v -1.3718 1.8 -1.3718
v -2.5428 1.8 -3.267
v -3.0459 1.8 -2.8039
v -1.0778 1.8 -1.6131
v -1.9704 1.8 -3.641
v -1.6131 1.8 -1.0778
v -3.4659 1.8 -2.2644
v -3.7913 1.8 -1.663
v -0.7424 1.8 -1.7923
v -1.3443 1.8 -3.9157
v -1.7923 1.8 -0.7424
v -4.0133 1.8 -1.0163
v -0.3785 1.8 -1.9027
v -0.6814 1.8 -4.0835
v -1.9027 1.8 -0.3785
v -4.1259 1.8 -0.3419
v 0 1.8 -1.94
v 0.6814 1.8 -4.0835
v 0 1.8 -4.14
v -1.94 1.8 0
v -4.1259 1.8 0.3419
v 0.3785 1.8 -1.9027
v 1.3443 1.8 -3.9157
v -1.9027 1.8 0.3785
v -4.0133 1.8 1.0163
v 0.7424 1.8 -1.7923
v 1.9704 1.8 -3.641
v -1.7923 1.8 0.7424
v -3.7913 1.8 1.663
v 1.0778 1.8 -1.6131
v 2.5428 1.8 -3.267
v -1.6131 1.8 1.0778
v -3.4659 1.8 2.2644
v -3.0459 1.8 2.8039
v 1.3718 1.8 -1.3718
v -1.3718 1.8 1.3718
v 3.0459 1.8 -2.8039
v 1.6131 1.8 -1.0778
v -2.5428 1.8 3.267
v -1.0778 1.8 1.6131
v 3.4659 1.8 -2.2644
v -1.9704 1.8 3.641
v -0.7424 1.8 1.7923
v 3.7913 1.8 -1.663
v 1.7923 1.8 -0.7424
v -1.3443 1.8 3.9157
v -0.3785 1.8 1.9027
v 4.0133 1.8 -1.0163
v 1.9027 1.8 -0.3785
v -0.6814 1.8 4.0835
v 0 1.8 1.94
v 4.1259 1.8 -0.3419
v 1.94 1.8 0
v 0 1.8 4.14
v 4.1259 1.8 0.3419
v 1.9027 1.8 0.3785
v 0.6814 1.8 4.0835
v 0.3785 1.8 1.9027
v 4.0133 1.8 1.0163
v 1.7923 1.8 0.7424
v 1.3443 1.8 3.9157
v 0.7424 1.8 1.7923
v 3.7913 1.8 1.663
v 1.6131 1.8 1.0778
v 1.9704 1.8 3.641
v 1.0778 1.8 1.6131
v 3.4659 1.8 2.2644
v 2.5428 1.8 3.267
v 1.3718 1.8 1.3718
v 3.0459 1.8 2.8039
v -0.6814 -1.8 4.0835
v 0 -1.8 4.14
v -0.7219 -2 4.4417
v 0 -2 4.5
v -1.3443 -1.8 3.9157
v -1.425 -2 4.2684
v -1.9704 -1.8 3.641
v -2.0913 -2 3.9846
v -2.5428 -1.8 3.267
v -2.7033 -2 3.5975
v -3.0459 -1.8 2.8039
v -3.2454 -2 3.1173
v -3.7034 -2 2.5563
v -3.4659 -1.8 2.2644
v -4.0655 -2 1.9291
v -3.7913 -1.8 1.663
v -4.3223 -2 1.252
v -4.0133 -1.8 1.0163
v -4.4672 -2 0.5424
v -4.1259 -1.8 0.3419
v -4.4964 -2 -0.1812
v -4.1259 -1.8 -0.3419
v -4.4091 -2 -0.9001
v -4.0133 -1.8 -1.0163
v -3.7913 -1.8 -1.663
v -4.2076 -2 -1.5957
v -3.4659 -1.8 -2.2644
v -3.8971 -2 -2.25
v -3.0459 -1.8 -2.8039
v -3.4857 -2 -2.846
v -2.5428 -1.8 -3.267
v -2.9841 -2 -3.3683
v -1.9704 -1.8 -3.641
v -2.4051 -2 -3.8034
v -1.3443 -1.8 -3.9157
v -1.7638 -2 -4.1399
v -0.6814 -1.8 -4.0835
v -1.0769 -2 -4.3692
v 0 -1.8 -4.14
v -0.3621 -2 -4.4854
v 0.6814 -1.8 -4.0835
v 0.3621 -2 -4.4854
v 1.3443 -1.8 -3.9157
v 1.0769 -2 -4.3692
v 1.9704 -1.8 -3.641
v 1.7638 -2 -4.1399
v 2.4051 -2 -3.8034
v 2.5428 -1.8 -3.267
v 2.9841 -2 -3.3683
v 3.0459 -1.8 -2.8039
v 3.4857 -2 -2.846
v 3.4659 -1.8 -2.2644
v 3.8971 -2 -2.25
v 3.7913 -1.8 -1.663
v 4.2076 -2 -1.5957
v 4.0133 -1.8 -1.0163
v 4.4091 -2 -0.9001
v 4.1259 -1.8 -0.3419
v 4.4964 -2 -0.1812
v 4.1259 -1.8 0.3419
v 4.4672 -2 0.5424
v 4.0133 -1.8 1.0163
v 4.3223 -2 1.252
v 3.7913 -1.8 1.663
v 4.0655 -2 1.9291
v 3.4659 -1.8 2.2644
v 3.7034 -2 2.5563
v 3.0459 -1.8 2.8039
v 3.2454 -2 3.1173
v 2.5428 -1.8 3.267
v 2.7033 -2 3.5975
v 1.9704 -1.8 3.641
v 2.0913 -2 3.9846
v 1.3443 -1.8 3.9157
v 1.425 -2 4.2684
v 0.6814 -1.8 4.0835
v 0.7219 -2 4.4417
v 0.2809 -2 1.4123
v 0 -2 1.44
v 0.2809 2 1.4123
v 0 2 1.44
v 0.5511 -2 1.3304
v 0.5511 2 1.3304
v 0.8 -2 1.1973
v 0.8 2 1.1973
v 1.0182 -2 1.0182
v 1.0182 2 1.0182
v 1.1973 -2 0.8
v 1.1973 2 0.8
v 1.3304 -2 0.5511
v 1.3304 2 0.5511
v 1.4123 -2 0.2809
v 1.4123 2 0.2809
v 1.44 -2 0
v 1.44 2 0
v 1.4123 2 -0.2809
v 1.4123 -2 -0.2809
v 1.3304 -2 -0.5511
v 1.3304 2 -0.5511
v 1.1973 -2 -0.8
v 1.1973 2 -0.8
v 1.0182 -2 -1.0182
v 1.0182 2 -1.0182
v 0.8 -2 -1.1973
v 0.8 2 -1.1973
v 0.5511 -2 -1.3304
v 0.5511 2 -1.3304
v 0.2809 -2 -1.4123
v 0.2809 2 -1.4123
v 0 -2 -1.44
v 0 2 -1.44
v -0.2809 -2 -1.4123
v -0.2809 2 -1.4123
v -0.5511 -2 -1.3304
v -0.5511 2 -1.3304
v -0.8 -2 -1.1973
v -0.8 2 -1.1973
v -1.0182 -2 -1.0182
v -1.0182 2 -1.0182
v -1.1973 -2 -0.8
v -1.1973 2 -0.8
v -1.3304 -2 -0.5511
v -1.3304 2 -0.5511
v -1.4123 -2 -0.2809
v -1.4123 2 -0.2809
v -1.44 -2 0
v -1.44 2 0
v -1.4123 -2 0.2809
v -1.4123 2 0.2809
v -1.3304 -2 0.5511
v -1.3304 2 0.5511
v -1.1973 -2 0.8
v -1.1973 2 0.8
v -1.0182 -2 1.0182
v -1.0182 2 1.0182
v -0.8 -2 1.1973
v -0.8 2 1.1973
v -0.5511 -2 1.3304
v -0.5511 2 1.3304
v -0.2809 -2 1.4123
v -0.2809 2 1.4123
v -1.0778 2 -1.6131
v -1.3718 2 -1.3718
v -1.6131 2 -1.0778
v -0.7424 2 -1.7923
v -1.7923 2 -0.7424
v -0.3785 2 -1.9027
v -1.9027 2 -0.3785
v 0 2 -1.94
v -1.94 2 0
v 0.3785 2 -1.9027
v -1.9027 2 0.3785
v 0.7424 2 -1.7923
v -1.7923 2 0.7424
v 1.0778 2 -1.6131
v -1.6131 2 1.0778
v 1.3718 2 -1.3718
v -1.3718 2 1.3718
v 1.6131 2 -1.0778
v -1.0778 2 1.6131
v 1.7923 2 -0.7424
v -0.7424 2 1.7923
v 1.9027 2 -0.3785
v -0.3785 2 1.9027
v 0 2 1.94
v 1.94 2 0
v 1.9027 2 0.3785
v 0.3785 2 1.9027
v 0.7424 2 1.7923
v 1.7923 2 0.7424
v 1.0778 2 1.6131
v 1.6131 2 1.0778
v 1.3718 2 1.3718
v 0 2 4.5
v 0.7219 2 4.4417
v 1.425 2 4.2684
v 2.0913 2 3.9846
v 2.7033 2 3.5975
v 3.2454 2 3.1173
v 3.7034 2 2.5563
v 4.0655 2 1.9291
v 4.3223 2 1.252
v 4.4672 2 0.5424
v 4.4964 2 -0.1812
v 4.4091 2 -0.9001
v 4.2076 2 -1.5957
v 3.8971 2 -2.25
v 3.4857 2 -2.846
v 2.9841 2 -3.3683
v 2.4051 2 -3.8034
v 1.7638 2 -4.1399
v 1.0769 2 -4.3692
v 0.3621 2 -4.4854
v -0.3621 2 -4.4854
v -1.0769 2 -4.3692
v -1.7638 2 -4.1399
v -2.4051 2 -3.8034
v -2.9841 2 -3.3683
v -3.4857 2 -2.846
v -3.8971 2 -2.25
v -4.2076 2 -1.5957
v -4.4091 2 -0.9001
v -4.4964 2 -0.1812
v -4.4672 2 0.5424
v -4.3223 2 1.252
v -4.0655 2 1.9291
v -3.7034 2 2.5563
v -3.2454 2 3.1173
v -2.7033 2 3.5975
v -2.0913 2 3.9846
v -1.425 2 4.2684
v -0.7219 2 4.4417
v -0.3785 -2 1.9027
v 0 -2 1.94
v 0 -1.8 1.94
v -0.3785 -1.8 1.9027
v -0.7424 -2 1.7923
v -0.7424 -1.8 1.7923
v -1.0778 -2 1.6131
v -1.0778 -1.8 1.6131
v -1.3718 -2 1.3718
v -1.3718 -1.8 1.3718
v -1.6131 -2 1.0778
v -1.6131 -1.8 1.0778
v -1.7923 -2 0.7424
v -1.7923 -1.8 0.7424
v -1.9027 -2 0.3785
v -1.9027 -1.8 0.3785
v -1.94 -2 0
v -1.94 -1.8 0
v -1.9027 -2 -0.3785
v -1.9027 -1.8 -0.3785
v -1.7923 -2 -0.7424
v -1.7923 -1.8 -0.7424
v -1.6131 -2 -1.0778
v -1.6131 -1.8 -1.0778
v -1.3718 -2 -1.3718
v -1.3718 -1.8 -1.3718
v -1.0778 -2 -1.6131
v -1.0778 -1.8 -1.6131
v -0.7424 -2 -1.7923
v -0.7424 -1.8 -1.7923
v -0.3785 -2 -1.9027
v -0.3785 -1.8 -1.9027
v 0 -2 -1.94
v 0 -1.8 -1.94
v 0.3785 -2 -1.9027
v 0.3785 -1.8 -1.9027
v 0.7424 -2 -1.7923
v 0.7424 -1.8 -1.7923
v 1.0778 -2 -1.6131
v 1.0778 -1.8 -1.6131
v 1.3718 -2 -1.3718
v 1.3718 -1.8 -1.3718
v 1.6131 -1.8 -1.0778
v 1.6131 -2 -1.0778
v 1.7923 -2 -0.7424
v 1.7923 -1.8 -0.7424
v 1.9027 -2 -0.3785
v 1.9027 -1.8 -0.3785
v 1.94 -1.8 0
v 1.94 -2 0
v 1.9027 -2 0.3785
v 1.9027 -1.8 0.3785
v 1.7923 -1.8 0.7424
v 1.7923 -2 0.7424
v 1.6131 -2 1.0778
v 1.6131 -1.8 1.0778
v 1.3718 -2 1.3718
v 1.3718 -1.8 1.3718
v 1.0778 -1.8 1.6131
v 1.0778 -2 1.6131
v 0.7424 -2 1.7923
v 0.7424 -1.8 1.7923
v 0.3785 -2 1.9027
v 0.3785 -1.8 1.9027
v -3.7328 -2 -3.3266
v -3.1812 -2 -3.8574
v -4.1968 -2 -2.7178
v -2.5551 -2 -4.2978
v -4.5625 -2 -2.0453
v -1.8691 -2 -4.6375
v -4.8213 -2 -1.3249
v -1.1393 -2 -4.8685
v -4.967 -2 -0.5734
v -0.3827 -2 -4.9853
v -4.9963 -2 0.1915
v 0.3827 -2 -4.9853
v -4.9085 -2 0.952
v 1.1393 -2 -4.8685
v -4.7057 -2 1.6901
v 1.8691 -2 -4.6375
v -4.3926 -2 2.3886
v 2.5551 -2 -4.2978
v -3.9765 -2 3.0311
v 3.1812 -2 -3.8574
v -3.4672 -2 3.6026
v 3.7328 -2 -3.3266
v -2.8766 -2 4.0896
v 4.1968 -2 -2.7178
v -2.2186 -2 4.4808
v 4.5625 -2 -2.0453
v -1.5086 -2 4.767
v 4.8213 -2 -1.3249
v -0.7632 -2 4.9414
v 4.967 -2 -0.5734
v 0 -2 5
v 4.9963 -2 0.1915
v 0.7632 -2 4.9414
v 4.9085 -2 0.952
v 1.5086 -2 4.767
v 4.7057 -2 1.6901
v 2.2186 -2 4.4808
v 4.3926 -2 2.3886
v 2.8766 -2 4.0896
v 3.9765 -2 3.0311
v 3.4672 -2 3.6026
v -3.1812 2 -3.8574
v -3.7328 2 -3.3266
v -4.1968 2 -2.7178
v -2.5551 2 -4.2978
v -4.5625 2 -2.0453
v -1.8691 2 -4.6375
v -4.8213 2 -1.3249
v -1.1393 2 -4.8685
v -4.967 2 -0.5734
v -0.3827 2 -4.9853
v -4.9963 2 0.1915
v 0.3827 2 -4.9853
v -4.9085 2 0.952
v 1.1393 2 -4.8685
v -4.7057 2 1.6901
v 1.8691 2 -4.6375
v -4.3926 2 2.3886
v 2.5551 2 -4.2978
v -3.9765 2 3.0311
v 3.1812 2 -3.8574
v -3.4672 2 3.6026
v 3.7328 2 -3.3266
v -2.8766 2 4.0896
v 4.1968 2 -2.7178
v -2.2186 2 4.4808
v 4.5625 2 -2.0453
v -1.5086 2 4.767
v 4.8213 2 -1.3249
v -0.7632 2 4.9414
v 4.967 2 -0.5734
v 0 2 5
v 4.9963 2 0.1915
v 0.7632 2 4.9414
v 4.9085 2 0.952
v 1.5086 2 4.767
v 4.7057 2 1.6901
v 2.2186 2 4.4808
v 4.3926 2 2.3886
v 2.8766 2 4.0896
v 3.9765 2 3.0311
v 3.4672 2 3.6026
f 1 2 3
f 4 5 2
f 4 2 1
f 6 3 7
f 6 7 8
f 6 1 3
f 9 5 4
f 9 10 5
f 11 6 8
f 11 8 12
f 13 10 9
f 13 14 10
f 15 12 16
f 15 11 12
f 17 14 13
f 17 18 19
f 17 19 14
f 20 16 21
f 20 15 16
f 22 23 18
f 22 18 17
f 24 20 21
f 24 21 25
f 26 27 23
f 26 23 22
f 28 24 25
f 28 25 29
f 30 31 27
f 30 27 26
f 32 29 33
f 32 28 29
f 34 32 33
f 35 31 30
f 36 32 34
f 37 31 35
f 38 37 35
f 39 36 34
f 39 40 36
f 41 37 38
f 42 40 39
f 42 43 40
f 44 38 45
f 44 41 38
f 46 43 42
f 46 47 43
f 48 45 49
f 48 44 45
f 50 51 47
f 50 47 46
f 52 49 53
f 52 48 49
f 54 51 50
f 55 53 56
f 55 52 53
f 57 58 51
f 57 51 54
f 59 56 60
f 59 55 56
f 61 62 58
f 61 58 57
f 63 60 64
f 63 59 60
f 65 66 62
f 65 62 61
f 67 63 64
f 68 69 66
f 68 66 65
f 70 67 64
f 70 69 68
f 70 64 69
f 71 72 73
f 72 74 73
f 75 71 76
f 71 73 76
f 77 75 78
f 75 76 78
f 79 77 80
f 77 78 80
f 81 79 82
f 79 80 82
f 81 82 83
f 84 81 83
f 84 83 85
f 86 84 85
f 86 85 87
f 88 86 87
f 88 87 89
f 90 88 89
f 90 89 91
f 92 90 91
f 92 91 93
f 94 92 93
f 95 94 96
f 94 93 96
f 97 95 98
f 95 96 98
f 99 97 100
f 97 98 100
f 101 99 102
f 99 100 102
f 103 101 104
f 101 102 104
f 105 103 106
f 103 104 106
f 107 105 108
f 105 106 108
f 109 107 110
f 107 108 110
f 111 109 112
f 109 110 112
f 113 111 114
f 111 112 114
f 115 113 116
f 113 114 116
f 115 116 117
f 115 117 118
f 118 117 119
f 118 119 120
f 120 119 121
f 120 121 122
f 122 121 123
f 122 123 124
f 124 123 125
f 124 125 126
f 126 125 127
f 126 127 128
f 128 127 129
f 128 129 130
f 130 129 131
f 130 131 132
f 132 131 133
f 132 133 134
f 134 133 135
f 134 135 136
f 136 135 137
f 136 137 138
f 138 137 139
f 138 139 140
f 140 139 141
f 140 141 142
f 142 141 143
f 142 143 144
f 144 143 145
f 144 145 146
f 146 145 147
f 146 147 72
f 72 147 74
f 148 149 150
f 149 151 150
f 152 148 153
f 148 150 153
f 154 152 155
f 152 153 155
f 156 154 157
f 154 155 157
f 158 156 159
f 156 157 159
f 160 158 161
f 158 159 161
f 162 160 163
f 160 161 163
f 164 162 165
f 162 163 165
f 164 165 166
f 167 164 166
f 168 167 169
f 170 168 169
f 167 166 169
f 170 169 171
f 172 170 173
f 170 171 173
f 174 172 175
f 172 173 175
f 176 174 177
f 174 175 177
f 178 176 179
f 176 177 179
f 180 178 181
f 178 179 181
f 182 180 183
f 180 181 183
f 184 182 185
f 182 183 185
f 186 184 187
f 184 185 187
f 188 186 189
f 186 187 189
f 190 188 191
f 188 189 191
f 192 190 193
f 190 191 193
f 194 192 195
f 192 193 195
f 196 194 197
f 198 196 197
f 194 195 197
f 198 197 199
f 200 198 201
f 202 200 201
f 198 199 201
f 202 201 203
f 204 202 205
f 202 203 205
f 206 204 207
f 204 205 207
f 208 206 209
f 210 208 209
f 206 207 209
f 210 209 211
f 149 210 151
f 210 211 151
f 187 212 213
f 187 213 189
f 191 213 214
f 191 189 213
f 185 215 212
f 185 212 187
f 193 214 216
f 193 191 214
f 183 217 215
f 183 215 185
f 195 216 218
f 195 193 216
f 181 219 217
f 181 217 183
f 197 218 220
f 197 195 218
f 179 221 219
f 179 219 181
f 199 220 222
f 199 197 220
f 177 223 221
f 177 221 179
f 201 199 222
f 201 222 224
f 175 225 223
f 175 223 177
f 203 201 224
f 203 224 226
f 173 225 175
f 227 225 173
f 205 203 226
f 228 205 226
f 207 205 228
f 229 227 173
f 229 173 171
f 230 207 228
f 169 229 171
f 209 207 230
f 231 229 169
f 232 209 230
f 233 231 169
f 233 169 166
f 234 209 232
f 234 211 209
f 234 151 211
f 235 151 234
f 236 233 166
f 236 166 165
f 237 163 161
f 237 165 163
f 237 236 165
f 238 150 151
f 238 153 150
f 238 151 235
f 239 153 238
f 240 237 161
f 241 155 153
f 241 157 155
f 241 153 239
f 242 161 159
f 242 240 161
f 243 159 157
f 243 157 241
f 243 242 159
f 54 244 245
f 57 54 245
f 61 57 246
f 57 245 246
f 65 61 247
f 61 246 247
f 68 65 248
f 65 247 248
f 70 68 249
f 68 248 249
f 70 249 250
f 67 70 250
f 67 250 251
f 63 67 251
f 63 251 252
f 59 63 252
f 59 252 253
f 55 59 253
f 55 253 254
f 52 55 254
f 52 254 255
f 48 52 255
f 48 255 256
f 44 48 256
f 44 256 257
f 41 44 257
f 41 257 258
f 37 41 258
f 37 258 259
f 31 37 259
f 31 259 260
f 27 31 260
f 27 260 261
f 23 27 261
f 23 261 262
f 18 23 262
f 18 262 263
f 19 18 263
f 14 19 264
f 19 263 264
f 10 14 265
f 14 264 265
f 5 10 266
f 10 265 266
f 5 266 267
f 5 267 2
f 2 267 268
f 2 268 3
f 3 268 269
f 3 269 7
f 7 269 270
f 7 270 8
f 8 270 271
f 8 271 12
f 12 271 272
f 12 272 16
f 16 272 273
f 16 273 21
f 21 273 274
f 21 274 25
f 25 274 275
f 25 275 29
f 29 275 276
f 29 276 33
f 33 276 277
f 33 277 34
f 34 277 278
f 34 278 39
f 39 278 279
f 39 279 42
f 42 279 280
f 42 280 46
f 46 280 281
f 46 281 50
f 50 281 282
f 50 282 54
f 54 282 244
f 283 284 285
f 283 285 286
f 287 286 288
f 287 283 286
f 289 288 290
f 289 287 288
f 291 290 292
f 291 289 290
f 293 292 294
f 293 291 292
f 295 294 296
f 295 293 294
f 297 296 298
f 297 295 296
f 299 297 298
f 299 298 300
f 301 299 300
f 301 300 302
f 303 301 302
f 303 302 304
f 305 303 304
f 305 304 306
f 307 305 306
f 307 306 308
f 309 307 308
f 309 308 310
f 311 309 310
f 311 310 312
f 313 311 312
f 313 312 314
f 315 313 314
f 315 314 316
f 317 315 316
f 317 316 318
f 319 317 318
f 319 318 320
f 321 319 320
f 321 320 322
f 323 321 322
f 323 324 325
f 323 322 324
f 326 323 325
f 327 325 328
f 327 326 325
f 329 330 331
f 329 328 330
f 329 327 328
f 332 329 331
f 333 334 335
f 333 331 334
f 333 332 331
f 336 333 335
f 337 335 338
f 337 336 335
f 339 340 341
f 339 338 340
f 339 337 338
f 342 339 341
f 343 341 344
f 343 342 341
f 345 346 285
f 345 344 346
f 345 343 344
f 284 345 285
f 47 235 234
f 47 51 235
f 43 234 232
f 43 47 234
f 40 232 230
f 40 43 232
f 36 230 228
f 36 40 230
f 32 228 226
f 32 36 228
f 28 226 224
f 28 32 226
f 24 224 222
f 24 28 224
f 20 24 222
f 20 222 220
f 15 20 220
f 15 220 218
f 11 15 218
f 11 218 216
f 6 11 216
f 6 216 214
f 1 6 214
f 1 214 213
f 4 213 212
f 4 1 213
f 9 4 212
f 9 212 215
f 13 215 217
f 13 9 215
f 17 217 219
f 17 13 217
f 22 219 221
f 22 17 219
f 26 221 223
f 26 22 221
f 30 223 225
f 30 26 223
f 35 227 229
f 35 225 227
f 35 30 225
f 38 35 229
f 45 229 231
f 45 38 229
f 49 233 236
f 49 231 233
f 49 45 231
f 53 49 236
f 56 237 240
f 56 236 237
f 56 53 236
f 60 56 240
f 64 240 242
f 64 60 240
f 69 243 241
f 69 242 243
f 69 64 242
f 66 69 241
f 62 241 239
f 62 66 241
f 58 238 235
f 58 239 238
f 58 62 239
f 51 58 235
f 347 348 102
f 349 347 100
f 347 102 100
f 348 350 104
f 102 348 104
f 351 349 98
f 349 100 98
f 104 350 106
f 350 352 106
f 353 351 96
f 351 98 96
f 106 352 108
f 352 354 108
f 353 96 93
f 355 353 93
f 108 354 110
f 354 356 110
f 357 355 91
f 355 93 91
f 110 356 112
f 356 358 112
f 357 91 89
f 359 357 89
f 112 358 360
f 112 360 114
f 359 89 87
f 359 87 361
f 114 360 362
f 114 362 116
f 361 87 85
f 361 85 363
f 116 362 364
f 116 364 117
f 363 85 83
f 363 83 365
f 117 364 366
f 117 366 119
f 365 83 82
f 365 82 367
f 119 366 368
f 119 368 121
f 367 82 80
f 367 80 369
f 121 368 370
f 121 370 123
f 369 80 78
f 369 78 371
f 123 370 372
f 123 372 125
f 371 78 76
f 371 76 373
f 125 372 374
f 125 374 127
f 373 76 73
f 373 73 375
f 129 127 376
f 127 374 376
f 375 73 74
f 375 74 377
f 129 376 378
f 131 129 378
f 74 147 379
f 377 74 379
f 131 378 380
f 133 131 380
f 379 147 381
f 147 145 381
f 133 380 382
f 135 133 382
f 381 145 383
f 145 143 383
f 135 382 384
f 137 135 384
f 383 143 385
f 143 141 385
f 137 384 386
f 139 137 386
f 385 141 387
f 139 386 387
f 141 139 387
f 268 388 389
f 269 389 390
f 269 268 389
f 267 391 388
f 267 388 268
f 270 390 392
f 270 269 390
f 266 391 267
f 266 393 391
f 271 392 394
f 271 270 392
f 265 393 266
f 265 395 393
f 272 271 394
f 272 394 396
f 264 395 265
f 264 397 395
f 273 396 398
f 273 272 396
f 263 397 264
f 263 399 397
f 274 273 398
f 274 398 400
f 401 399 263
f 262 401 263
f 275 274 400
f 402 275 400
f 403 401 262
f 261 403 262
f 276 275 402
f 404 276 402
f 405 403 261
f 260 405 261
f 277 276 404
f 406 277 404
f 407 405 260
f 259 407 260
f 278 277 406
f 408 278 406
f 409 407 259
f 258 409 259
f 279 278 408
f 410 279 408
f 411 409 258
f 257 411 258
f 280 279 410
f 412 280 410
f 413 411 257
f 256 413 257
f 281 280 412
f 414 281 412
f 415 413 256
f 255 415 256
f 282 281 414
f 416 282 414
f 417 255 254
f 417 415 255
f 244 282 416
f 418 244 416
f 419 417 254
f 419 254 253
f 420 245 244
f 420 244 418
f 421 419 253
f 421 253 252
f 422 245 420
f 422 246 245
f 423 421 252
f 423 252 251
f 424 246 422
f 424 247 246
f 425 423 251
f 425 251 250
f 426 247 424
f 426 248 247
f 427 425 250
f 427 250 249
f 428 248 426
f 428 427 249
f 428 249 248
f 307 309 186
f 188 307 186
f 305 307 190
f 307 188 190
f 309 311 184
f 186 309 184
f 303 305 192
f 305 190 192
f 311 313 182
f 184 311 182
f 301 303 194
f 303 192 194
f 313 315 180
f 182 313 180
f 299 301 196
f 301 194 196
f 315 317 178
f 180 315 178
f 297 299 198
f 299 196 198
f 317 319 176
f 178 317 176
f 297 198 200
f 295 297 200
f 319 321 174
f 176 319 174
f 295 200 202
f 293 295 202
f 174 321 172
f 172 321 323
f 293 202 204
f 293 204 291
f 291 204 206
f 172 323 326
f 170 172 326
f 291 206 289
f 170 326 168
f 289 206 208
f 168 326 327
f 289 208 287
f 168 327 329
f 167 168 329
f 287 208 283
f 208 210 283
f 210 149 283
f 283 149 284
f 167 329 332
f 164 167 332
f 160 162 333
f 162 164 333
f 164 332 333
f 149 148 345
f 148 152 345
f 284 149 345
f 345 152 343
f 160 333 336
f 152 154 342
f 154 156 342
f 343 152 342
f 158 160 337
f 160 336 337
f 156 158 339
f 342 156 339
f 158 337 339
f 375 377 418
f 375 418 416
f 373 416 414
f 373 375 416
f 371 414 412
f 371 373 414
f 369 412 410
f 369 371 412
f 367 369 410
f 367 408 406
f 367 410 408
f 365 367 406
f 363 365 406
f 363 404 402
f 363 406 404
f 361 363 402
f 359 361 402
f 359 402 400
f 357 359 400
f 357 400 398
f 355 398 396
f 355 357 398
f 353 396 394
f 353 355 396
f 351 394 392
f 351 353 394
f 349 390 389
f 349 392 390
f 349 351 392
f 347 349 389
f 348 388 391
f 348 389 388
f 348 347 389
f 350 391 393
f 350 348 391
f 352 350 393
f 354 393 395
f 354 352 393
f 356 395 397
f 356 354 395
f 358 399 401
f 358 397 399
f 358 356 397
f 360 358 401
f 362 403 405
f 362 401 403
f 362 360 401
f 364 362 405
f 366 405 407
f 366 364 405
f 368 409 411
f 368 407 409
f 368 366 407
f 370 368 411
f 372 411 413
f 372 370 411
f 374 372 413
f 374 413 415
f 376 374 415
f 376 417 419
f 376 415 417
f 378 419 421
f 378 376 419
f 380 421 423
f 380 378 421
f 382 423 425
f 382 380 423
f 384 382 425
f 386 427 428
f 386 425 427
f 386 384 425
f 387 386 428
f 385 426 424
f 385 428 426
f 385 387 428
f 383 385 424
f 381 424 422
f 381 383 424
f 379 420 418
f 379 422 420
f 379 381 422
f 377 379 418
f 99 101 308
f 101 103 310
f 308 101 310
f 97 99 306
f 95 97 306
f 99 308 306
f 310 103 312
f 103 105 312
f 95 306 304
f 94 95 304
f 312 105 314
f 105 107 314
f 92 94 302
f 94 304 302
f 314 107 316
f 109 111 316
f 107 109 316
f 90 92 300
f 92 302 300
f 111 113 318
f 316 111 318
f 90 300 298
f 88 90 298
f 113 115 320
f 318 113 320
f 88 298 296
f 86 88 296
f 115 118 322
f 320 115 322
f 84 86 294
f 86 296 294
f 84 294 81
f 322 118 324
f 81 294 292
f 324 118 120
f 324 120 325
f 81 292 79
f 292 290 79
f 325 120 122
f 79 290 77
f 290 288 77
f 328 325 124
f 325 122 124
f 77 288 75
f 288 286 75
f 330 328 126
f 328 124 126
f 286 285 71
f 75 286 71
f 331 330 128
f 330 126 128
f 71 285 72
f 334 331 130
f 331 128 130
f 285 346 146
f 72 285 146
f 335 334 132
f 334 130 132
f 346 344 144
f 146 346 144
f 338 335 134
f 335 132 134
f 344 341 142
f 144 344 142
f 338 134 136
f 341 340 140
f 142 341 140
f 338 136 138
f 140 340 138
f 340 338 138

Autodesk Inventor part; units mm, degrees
ref_plane "YZ Plane" through (0, 0, 0) normal (1, 0, 0) x (0, 1, 0)
ref_plane "XZ Plane" through (0, 0, 0) normal (0, 1, 0) x (-1, 0, 0)
ref_plane "XY Plane" through (0, 0, 0) normal (0, 0, 1) x (1, 0, 0)
sketch "Sketch1" plane through (0, 0, 0) normal (1, 0, 0) x (0, 1, 0)
  line L0 (0, -1) -> (0, 6) projected
  line L1 (-2.8, 0) -> (2.8, 0) projected
  line L2 (-2, 1.44) -> (2, 1.44)
  line L3 (2, 1.44) -> (2, 1.94)
  line L4 (2, 1.94) -> (1.8, 1.94)
  line L5 (1.8, 1.94) -> (1.8, 4.14)
  line L6 (1.8, 4.14) -> (2, 4.5)
  line L7 (2, 4.5) -> (2, 5)
  line L8 (2, 5) -> (-2, 5)
  line L9 (-2, 5) -> (-2, 4.5)
  line L10 (-2, 4.5) -> (-1.8, 4.14)
  line L11 (-1.8, 4.14) -> (-1.8, 1.94)
  line L12 (-1.8, 1.94) -> (-2, 1.94)
  line L13 (-2, 1.94) -> (-2, 1.44)
  point P0 (0, 0)
  dimension "d0" = 2.88
  dimension "d1" = 10
  dimension "d2" = 4
  dimension "d3" = 0.5
  dimension "d4" = 0.5
  dimension "d5" = 2.2
  dimension "d6" = 0.2
revolve "Revolution1" add sketch "Sketch1" angle 360 about axis through (0, -10, 0) along (0, 1, 0)
properties part number "empty"
